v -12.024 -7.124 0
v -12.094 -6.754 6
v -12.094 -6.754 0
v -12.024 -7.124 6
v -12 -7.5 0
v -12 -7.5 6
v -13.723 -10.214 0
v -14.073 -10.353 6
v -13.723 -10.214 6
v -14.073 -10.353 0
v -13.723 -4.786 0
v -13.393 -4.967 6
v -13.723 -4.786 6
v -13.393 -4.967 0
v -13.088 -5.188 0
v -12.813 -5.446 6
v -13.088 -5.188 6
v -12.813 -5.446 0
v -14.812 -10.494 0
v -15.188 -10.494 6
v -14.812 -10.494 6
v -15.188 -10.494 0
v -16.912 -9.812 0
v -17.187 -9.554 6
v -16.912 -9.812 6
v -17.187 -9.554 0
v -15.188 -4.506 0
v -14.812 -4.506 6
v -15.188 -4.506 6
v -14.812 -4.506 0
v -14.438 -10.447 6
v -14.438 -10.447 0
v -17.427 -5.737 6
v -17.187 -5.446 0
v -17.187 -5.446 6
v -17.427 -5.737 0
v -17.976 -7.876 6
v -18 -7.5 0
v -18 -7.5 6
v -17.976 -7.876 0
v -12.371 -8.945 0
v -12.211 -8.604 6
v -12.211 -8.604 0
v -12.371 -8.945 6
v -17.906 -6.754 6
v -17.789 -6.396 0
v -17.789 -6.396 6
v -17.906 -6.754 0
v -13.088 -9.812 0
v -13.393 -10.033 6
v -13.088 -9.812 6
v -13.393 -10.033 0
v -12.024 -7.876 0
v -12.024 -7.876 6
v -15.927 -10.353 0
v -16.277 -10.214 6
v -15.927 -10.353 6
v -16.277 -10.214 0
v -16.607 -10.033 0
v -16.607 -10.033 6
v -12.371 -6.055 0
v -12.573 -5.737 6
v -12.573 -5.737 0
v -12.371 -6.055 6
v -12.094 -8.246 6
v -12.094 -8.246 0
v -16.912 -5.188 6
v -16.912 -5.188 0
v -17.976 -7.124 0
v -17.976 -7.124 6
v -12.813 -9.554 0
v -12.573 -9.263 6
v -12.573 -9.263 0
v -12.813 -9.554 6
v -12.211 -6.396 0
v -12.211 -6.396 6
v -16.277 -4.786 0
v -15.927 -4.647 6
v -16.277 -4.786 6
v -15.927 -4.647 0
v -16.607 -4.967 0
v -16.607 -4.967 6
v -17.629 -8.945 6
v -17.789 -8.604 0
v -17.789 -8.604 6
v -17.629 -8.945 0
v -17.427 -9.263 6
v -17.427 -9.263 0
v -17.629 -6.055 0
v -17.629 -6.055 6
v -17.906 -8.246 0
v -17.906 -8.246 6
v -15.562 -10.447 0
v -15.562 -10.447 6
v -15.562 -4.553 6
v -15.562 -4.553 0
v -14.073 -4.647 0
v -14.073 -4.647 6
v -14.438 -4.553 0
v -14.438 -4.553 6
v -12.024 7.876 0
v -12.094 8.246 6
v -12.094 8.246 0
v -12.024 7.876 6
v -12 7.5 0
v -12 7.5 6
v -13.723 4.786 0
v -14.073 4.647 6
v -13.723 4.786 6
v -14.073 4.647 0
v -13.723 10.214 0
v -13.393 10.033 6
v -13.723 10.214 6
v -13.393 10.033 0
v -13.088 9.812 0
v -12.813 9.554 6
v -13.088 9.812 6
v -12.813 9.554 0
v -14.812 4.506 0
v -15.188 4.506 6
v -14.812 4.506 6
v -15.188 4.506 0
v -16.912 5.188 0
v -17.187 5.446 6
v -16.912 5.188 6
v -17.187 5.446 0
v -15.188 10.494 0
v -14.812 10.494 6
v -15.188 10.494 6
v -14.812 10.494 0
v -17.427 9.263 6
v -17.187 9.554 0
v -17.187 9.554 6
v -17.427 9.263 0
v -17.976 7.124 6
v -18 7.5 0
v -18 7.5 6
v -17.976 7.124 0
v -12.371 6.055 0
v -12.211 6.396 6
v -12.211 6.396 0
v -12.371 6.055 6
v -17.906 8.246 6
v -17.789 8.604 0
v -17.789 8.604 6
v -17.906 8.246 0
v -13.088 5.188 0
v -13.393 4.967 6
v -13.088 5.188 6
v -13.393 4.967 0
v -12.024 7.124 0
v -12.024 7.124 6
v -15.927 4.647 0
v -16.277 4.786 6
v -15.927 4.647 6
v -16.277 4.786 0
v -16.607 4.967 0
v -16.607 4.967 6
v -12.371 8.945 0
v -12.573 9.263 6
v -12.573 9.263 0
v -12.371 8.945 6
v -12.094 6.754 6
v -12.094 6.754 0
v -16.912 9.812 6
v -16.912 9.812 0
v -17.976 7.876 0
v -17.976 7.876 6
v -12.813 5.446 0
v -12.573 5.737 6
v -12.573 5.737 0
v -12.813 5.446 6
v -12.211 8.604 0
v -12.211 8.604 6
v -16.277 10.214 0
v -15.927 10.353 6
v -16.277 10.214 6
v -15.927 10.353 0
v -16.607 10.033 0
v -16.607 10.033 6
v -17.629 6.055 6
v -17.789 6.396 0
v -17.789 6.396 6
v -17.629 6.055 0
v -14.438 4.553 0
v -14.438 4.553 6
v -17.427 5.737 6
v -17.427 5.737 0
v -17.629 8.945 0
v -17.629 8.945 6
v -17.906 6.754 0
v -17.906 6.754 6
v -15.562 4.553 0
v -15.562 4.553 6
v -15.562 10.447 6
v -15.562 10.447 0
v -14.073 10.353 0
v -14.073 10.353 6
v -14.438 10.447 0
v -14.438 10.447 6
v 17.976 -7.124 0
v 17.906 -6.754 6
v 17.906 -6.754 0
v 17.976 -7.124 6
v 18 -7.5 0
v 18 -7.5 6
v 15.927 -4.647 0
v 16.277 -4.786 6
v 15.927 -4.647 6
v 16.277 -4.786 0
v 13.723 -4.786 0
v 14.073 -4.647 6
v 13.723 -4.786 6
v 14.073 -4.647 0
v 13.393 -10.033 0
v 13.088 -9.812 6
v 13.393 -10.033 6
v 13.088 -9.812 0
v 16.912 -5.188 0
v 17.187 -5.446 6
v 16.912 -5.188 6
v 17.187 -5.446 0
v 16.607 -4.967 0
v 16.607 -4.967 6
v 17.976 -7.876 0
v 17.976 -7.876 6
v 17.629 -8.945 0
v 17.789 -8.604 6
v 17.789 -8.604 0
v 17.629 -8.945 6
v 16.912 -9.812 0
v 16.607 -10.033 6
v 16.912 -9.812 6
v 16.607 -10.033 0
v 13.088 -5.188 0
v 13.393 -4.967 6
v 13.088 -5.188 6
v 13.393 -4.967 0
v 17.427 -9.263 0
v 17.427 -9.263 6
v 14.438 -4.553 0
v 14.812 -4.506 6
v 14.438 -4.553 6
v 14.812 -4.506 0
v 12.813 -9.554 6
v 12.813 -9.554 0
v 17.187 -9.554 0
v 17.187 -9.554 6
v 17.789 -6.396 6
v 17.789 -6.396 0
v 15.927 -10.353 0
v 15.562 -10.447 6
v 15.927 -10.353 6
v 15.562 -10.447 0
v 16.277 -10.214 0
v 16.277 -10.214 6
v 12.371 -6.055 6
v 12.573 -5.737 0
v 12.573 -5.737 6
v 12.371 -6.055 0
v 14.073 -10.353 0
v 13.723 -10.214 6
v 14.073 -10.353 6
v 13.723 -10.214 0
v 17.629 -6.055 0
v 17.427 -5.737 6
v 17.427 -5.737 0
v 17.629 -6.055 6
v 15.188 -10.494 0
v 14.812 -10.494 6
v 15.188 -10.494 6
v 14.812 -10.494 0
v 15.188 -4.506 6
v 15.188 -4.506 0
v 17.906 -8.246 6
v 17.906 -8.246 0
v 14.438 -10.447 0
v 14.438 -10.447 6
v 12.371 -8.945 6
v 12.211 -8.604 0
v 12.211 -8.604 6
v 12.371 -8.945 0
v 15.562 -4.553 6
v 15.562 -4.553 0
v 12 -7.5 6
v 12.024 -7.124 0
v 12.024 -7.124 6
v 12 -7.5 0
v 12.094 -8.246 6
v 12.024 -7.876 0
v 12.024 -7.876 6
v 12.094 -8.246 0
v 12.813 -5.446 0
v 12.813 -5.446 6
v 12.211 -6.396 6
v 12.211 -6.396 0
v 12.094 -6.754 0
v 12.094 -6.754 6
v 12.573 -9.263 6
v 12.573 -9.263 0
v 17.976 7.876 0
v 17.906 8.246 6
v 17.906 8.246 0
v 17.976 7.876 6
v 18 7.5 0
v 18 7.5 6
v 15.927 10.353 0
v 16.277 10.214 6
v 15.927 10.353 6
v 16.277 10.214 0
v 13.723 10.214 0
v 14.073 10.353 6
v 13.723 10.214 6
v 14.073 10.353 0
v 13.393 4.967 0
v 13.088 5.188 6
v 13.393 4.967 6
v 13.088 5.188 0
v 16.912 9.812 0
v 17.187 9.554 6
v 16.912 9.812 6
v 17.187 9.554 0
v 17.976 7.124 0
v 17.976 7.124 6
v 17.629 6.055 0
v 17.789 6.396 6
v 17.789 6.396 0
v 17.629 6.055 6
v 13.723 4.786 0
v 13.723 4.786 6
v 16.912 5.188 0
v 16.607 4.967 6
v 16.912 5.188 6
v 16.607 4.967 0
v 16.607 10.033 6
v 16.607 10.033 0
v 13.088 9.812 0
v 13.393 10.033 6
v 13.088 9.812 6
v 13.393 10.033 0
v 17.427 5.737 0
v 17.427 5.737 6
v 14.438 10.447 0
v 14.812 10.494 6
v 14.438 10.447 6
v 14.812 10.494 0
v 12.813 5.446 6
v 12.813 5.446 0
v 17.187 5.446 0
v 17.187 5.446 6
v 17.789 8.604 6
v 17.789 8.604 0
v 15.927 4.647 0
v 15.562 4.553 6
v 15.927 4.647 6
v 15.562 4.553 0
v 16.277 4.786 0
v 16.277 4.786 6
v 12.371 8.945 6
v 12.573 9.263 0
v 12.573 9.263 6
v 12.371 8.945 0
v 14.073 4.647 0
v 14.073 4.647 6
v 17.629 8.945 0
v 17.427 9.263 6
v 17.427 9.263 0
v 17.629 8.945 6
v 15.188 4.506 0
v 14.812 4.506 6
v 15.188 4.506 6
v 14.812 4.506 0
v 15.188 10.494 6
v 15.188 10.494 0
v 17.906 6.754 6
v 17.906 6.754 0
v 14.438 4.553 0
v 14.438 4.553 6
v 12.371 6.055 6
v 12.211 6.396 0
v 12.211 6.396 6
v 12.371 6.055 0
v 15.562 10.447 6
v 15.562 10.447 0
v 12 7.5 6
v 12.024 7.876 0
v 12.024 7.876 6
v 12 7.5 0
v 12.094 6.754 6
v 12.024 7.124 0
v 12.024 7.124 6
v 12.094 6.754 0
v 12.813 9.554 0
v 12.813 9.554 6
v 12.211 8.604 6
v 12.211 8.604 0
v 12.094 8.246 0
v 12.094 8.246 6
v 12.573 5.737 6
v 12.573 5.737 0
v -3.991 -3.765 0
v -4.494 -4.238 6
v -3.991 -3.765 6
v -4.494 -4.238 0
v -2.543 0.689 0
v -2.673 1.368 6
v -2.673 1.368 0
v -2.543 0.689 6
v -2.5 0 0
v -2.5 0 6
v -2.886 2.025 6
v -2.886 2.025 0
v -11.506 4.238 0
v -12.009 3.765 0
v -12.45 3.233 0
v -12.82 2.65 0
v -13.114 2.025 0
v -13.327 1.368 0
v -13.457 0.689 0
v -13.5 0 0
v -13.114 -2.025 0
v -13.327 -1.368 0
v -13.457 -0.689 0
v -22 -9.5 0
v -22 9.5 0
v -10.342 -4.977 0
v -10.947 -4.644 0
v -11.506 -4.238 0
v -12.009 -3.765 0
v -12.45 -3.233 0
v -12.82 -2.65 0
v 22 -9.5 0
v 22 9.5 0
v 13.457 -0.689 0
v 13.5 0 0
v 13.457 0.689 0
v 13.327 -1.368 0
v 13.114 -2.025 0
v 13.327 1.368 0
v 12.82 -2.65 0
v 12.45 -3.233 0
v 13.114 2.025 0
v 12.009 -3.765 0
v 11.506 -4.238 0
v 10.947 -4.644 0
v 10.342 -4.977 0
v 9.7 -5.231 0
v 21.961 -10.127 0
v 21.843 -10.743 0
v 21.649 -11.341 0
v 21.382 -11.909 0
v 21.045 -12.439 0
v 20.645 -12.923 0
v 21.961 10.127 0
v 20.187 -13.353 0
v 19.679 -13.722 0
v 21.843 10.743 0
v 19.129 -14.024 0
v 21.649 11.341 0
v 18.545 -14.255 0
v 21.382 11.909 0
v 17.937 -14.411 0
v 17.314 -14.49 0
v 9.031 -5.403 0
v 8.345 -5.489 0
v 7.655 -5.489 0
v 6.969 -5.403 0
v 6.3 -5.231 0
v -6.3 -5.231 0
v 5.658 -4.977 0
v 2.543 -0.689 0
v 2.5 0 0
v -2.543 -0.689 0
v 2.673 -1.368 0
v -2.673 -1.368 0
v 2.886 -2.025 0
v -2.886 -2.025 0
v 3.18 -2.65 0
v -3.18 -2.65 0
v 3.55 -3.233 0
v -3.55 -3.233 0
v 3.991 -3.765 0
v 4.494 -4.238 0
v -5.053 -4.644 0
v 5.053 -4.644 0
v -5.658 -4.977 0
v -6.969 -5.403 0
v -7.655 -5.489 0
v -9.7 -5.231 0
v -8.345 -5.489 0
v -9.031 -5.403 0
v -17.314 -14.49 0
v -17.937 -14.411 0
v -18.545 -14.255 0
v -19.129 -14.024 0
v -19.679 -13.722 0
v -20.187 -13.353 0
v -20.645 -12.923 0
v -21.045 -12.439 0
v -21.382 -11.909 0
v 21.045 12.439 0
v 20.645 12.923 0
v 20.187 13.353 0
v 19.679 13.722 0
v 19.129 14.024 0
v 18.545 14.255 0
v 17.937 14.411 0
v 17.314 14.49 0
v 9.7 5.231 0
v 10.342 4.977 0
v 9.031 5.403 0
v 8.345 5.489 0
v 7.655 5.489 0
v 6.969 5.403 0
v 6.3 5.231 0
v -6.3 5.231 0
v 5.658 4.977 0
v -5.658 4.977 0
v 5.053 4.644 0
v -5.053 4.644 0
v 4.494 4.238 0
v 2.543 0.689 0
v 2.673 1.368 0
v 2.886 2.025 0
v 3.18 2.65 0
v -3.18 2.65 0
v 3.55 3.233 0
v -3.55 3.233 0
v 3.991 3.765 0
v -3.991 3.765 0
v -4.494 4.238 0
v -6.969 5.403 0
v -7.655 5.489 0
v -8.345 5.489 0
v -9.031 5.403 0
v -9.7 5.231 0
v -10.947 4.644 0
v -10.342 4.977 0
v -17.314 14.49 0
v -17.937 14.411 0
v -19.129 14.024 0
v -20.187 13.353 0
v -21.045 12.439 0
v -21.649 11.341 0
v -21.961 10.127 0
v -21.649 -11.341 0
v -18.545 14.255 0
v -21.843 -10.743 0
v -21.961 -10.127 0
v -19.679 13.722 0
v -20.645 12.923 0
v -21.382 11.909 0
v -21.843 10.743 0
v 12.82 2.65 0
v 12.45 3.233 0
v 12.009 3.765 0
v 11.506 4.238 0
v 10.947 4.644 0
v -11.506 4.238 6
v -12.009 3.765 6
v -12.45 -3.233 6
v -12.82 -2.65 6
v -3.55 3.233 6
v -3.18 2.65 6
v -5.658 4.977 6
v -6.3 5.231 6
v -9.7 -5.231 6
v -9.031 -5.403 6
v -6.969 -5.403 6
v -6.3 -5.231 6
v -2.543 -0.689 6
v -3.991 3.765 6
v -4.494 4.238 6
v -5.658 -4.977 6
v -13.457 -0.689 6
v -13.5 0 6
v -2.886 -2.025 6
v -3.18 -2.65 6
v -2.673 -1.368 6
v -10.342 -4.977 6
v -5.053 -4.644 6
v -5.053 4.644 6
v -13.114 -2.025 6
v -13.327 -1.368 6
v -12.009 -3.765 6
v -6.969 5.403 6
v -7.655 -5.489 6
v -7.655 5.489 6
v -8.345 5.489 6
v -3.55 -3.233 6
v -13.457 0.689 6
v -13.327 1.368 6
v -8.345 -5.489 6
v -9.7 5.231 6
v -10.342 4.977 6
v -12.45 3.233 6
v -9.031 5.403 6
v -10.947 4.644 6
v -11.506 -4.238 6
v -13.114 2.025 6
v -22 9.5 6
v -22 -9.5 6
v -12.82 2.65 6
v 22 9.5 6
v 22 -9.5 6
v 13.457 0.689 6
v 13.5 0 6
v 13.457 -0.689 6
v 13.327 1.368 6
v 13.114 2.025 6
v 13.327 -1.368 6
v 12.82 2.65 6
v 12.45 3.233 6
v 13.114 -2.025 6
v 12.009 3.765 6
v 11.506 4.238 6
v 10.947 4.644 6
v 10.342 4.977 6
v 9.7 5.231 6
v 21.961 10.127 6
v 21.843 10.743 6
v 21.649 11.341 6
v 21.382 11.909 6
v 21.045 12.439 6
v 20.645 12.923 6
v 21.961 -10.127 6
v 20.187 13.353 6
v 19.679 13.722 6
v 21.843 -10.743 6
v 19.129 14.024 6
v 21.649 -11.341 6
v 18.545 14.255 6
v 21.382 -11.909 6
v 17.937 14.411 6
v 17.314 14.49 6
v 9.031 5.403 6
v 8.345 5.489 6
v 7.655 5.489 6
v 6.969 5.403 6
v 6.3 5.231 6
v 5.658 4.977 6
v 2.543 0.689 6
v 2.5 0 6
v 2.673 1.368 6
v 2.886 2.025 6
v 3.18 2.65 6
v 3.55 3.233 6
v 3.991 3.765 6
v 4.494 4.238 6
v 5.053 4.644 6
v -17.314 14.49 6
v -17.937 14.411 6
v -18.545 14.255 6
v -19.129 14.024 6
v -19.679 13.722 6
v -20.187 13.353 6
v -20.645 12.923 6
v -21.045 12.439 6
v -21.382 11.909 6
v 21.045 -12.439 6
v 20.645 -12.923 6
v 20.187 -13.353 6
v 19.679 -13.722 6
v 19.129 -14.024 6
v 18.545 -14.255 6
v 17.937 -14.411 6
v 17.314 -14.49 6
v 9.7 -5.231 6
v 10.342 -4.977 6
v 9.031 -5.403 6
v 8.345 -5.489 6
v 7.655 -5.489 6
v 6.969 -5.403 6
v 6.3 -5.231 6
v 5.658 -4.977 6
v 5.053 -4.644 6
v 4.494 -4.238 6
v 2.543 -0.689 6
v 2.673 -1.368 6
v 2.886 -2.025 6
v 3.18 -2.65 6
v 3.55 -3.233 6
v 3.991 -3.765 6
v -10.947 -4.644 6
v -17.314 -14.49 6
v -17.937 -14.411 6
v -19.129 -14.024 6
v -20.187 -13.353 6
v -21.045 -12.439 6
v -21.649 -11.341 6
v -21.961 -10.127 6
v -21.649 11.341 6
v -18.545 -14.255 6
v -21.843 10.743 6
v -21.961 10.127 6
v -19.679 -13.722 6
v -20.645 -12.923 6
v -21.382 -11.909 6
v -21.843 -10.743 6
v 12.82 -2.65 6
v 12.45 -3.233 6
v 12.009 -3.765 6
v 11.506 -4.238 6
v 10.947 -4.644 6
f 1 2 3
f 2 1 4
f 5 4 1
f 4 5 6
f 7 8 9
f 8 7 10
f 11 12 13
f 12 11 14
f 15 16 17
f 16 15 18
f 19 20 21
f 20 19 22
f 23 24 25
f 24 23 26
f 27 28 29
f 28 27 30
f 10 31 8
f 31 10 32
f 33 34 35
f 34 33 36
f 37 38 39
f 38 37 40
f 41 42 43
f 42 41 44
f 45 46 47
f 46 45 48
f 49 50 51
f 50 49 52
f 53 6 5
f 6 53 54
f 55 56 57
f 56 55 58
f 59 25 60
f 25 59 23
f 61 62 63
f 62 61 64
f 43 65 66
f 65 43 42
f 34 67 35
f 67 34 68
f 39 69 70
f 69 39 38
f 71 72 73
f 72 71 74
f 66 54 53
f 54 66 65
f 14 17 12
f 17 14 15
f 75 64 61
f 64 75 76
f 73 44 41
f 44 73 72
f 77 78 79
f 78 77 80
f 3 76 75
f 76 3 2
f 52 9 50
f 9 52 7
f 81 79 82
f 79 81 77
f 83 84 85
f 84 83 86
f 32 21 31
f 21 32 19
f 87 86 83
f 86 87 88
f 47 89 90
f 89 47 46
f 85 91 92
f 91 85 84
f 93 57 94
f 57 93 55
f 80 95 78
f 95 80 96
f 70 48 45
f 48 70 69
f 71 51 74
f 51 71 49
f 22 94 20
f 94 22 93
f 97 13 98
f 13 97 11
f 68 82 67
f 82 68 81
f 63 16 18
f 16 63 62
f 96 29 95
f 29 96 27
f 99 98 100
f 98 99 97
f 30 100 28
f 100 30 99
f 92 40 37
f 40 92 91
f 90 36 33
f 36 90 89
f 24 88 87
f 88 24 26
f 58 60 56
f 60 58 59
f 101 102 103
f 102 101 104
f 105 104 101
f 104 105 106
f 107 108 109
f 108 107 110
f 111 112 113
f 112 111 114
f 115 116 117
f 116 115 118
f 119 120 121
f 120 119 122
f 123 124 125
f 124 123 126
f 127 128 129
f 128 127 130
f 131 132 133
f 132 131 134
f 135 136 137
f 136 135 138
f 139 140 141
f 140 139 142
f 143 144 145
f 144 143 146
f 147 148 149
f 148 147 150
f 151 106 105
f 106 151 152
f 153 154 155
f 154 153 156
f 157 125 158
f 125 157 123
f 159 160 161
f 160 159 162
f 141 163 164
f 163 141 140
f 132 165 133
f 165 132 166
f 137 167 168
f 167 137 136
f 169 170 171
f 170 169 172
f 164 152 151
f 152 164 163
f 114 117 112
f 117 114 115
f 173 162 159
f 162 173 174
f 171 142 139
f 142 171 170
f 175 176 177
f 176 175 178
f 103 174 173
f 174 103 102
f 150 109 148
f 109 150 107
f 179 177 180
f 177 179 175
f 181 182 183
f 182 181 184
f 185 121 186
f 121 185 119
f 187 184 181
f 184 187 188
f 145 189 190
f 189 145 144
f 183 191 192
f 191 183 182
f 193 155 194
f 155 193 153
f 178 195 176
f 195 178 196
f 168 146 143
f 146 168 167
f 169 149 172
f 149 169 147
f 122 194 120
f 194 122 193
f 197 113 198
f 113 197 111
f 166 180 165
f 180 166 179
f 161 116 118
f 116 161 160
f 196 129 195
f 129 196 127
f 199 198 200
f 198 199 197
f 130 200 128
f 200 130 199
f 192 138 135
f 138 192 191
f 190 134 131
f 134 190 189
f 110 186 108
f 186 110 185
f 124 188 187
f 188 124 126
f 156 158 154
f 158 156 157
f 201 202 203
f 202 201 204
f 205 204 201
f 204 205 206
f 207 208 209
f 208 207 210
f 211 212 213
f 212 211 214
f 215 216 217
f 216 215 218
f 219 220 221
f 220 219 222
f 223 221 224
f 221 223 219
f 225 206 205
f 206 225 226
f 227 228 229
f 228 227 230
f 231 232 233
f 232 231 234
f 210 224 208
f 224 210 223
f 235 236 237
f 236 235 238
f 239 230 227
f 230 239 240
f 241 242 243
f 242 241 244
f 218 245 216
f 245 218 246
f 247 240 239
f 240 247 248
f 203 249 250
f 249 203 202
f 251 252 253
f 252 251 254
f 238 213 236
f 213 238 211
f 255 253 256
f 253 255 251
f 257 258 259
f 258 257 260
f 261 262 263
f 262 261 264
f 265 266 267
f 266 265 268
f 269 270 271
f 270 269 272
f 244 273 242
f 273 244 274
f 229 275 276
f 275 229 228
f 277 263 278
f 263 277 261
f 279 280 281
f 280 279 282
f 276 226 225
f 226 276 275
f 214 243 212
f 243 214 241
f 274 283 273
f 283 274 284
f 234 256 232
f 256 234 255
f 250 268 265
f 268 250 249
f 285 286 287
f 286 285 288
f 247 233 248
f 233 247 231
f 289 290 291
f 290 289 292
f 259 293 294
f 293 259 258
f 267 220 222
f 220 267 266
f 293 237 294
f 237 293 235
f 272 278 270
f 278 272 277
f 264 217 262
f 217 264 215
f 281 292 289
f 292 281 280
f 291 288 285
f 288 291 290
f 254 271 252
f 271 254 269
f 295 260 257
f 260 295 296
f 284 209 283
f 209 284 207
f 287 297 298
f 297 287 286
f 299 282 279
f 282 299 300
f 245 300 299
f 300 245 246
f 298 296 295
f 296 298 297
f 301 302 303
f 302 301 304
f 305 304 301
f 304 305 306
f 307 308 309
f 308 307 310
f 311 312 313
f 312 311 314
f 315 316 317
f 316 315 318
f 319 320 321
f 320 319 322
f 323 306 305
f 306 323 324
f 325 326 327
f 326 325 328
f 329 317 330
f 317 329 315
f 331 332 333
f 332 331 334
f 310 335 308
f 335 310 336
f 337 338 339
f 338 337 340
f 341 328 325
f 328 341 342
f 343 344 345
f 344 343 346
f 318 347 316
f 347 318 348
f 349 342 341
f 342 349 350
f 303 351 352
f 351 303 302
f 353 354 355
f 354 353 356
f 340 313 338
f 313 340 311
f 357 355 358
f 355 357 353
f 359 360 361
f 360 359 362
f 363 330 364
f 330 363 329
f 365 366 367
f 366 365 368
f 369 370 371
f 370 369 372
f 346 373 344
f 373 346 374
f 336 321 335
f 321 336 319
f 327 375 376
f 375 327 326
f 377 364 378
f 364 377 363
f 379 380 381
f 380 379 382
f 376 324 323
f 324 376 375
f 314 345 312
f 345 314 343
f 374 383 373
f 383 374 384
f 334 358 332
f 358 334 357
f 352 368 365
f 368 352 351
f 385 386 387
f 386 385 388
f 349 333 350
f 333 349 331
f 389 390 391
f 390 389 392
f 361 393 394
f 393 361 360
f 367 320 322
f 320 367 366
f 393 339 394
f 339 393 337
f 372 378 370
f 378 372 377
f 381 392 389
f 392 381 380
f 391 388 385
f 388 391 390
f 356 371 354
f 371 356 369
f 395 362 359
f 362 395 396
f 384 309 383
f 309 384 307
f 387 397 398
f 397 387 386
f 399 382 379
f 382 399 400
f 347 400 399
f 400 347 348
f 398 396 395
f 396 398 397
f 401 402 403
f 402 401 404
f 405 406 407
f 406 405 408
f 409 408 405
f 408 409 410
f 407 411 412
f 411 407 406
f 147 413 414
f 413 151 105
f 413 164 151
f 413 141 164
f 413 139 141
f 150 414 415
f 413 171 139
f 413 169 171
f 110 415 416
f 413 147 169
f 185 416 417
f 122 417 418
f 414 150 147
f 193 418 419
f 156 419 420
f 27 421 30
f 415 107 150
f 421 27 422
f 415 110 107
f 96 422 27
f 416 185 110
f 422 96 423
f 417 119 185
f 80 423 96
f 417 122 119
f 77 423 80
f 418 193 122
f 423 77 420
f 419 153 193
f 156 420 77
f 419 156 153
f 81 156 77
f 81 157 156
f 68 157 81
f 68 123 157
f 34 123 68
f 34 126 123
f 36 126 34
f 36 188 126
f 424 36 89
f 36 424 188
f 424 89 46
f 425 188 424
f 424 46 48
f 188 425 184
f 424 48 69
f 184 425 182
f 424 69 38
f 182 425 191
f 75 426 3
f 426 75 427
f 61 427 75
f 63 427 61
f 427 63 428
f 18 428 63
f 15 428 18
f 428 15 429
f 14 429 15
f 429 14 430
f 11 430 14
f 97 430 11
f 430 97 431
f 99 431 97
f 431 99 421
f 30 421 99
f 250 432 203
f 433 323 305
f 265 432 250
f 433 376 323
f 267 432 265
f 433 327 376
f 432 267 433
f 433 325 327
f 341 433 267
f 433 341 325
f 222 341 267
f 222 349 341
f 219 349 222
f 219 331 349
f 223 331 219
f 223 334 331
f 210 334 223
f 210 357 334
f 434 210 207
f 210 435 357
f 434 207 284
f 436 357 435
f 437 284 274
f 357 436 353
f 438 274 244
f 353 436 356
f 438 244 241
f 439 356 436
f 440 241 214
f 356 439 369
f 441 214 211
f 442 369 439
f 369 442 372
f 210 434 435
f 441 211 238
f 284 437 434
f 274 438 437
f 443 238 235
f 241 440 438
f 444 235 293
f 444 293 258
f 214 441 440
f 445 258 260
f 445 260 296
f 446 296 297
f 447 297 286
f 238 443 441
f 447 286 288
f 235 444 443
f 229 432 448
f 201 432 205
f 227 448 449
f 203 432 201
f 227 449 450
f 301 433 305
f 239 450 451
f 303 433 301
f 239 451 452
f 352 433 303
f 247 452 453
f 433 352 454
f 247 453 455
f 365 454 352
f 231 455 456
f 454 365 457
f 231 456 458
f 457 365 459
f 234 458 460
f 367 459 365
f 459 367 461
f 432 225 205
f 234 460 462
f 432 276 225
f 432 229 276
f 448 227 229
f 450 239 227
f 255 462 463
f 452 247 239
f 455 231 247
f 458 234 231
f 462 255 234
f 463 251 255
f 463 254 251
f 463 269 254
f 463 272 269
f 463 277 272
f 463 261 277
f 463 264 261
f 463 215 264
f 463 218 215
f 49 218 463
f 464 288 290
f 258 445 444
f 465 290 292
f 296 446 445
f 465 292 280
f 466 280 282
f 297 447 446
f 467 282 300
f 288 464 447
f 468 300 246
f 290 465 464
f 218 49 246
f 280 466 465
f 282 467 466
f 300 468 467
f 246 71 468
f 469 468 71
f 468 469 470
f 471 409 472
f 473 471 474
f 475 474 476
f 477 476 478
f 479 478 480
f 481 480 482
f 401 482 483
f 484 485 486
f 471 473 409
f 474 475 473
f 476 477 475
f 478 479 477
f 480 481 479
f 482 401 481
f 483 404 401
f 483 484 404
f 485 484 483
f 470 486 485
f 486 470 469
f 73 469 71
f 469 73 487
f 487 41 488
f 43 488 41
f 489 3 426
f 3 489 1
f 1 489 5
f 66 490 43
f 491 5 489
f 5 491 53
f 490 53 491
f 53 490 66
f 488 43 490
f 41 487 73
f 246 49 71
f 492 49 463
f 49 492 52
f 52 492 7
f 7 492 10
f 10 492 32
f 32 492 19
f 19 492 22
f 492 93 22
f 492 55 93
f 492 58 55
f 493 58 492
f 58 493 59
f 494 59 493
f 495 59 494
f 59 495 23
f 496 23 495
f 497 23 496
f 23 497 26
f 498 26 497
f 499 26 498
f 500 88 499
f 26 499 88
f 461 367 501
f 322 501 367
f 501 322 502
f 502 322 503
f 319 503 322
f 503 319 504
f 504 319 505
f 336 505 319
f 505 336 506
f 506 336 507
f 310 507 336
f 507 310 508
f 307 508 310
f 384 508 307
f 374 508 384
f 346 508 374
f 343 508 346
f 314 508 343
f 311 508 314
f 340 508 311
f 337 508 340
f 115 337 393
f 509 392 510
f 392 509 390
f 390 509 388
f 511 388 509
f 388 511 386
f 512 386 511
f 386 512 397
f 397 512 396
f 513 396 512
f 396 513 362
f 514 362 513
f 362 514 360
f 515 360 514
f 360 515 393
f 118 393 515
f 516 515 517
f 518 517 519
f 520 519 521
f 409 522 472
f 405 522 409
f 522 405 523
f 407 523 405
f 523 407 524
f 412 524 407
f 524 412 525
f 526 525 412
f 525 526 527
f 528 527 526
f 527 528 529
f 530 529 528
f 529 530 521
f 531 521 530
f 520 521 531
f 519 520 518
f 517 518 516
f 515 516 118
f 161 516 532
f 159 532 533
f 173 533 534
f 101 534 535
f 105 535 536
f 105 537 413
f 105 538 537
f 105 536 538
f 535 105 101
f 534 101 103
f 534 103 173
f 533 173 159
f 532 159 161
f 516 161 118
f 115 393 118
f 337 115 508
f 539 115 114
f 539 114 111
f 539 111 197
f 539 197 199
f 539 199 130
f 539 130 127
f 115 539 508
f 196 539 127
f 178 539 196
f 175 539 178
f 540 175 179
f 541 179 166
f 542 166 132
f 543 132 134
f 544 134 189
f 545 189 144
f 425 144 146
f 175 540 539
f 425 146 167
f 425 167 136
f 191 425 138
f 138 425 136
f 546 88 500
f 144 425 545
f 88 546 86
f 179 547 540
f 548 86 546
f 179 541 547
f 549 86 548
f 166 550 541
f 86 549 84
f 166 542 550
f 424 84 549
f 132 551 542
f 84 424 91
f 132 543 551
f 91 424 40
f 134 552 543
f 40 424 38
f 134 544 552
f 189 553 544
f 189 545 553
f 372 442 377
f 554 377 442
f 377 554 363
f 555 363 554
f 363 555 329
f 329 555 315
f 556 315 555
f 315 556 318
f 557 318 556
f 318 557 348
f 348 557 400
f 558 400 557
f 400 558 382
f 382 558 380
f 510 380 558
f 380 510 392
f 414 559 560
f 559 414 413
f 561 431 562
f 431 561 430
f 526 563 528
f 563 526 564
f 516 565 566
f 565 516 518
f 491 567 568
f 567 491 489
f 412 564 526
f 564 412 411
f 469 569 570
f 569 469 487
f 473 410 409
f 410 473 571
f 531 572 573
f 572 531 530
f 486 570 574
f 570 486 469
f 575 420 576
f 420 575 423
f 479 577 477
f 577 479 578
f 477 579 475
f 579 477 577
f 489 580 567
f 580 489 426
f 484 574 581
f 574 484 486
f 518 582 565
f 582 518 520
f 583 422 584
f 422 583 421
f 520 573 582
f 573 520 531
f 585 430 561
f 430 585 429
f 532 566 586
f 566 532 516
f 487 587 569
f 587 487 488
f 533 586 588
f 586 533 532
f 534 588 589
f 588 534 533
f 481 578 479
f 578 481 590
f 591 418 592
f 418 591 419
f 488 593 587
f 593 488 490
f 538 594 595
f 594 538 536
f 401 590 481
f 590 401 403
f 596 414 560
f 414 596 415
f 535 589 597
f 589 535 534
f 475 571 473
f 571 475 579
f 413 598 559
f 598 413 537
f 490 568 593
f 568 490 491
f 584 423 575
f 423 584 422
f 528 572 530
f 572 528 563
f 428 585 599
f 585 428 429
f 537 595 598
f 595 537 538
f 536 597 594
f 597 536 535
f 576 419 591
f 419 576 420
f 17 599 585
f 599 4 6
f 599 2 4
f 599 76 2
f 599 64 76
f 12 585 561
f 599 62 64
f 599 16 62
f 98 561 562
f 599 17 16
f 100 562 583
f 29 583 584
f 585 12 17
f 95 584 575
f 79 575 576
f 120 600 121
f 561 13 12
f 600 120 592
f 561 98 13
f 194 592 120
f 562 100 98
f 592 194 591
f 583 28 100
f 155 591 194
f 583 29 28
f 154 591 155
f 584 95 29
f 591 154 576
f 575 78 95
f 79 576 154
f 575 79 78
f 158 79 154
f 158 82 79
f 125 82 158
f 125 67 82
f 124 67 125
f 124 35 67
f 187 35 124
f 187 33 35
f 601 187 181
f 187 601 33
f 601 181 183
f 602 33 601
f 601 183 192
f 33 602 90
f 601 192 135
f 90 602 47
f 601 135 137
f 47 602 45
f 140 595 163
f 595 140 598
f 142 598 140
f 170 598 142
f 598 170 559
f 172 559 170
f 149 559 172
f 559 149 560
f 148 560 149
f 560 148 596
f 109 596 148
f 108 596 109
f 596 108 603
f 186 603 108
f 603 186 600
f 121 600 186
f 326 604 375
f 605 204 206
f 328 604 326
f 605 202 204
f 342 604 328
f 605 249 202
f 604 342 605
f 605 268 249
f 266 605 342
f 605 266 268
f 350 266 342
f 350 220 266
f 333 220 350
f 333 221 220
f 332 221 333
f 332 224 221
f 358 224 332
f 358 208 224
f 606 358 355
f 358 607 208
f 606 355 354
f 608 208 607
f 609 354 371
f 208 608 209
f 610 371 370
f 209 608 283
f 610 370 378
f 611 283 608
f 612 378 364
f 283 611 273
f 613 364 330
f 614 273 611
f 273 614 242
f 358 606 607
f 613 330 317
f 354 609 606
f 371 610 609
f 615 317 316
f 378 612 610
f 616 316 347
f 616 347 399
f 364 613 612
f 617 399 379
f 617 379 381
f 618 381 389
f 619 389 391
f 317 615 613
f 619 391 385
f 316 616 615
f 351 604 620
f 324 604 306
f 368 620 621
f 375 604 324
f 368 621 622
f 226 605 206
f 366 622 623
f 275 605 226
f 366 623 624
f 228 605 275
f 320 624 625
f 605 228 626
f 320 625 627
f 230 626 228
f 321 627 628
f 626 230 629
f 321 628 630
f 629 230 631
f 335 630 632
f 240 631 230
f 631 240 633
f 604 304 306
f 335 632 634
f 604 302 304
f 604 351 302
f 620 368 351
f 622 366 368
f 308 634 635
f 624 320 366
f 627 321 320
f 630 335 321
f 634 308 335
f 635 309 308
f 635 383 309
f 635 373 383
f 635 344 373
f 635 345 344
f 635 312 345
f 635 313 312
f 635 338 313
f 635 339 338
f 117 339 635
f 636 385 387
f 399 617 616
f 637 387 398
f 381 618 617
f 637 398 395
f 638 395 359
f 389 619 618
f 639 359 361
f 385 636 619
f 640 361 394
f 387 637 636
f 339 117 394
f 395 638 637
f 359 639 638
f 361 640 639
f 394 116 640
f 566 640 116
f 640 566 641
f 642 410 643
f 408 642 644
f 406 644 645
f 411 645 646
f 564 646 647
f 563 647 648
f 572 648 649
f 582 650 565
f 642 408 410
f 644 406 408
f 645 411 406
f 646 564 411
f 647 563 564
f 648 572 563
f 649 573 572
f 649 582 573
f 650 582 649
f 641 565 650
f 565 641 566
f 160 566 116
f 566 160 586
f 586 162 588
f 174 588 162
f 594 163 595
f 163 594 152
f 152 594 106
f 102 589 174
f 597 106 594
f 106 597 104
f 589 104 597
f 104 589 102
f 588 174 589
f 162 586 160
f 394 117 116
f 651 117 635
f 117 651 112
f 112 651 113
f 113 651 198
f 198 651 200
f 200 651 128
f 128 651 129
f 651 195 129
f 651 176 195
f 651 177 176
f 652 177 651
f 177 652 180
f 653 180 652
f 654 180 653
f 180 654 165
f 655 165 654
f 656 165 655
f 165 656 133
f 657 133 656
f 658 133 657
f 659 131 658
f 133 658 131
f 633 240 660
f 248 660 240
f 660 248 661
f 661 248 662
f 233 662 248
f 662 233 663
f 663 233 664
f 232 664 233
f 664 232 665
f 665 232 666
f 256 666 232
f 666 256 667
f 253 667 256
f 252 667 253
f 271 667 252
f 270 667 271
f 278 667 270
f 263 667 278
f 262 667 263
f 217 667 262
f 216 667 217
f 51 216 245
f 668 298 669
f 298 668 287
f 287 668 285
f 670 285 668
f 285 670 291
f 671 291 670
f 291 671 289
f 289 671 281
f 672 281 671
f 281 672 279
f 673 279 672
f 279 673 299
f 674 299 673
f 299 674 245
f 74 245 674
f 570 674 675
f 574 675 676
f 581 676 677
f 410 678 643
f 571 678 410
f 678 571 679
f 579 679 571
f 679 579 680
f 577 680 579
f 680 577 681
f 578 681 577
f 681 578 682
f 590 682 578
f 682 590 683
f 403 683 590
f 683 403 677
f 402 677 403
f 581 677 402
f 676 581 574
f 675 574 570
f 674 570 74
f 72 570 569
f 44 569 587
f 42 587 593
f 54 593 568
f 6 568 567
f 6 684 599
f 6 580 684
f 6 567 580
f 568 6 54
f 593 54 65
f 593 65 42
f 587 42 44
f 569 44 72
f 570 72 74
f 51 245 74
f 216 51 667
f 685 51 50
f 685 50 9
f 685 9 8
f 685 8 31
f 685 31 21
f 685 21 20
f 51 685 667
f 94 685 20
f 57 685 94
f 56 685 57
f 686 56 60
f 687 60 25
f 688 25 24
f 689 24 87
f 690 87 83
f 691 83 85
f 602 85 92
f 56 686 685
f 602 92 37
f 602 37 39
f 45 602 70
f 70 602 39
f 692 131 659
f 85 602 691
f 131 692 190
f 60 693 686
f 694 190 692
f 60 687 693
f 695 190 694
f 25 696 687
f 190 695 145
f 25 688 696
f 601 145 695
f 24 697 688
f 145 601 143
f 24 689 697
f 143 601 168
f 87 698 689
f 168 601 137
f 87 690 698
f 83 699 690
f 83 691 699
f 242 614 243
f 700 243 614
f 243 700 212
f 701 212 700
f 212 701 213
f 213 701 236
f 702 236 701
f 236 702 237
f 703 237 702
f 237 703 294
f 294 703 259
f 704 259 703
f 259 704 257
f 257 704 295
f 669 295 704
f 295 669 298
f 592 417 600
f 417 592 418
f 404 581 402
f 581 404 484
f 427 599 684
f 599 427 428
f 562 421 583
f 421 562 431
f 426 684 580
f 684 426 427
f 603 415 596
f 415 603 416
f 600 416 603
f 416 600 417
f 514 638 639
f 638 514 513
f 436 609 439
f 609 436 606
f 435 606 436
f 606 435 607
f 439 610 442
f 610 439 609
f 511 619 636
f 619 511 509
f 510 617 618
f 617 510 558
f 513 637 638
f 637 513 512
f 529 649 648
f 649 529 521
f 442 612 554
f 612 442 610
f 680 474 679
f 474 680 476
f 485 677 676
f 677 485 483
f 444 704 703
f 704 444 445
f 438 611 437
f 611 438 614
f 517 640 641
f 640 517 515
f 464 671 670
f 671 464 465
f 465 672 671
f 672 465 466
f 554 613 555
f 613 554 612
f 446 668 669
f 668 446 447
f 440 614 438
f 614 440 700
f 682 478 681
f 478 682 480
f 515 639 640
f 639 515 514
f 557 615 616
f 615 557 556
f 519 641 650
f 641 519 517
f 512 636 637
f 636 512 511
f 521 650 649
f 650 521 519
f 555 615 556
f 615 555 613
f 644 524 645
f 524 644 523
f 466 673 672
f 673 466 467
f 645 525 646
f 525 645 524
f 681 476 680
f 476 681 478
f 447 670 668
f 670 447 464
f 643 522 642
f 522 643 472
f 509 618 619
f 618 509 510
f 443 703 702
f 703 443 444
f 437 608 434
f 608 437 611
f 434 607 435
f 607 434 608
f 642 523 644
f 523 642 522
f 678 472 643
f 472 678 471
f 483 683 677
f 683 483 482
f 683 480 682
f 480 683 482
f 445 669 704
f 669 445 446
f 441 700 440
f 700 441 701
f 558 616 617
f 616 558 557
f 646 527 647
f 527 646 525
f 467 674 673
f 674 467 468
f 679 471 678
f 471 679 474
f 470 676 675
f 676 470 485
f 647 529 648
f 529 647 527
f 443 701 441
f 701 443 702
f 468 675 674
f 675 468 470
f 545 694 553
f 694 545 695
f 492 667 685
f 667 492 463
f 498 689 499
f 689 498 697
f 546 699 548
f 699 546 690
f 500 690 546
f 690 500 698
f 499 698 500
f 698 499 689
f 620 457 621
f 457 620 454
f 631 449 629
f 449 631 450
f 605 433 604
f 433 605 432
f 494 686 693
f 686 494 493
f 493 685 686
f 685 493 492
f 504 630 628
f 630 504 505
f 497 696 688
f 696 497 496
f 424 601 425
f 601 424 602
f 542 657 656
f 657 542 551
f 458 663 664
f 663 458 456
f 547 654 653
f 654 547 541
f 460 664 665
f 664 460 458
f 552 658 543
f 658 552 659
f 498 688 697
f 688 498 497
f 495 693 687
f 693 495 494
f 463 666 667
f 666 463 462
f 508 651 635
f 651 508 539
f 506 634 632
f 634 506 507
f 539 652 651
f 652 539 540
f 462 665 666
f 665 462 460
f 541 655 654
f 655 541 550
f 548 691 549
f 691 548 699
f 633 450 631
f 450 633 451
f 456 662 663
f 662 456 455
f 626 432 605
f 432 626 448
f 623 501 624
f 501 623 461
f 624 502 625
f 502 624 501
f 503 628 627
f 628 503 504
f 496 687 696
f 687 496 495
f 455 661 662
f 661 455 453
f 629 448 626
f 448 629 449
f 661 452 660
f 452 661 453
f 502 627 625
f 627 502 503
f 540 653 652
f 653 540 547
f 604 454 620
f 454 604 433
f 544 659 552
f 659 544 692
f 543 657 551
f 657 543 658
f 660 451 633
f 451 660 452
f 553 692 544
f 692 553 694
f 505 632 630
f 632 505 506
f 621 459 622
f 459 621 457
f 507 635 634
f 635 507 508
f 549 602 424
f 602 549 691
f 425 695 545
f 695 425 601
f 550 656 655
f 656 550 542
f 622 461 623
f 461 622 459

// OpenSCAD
$fn = 50;


difference() {
	union() {
		hull() {
			translate(v = [-17.0000000000, 9.5000000000, 0]) {
				cylinder(h = 6, r = 5);
			}
			translate(v = [17.0000000000, 9.5000000000, 0]) {
				cylinder(h = 6, r = 5);
			}
			translate(v = [-17.0000000000, -9.5000000000, 0]) {
				cylinder(h = 6, r = 5);
			}
			translate(v = [17.0000000000, -9.5000000000, 0]) {
				cylinder(h = 6, r = 5);
			}
		}
	}
	union() {
		#translate(v = [-15.0000000000, -7.5000000000, -100.0000000000]) {
			cylinder(h = 200, r = 3.0000000000);
		}
		#translate(v = [-15.0000000000, 7.5000000000, -100.0000000000]) {
			cylinder(h = 200, r = 3.0000000000);
		}
		#translate(v = [15.0000000000, -7.5000000000, -100.0000000000]) {
			cylinder(h = 200, r = 3.0000000000);
		}
		#translate(v = [15.0000000000, 7.5000000000, -100.0000000000]) {
			cylinder(h = 200, r = 3.0000000000);
		}
		#translate(v = [-8.0000000000, 0, 0]) {
			cylinder(h = 6, r = 5.5000000000);
		}
		#translate(v = [8.0000000000, 0, 0]) {
			cylinder(h = 6, r = 5.5000000000);
		}
	}
}
